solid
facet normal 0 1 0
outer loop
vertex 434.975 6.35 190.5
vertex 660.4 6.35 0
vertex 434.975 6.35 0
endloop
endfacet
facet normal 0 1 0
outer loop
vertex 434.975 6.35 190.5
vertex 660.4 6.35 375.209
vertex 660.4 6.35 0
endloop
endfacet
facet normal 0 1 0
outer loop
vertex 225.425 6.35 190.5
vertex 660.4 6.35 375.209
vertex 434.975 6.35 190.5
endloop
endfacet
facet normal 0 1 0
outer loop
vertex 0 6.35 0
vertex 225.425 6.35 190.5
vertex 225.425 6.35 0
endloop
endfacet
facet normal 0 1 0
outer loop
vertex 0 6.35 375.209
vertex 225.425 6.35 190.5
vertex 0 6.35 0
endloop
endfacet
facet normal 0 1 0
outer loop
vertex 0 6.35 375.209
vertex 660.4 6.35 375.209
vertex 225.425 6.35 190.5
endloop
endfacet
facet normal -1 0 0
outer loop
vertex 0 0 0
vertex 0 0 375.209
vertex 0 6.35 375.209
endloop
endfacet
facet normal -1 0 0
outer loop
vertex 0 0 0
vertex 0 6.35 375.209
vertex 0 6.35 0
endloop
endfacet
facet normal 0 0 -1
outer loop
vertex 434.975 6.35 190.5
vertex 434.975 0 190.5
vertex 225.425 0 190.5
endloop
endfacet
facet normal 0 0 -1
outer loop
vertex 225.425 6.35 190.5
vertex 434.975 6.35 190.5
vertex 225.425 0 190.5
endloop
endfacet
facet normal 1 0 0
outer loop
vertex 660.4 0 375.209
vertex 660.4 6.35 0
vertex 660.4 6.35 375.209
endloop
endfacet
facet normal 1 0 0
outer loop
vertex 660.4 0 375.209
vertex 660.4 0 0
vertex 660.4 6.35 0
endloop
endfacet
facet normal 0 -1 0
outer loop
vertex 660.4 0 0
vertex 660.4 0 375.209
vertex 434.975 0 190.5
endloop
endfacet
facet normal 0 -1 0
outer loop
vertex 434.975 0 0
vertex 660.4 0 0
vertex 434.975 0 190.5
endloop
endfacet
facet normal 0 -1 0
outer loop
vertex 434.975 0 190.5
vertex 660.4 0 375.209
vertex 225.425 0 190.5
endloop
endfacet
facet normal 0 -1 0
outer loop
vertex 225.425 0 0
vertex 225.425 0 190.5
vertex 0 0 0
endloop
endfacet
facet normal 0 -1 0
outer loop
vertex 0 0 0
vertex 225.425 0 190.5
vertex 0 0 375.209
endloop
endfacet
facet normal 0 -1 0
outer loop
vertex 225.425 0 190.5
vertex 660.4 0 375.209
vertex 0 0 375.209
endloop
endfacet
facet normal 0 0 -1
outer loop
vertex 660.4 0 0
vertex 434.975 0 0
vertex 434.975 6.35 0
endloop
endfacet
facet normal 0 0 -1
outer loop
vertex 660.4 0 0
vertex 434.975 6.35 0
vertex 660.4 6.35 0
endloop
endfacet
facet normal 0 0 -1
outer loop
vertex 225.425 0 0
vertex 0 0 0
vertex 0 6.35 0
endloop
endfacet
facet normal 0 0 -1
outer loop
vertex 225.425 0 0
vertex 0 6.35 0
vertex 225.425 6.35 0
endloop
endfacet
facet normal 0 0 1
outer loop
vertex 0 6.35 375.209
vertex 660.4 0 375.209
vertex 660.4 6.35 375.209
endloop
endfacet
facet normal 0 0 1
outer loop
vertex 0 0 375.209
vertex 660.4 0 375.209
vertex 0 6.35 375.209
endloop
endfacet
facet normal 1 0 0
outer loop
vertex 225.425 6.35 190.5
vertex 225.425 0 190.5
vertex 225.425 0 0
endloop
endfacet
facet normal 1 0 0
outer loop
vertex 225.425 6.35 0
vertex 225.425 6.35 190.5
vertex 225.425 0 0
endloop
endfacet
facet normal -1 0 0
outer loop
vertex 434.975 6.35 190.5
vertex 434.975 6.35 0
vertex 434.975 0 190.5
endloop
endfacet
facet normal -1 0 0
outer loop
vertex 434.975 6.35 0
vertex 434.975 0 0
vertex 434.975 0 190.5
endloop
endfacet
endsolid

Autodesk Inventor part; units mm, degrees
ref_plane "YZ Plane" through (0, 0, 0) normal (1, 0, 0) x (0, 1, 0)
ref_plane "XZ Plane" through (0, 0, 0) normal (0, 1, 0) x (-1, 0, 0)
ref_plane "XY Plane" through (0, 0, 0) normal (0, 0, 1) x (1, 0, 0)
sketch "Sketch1" plane through (0, 0, 0) normal (0, 1, 0) x (-1, 0, 0)
  line L0 (0, 0) -> (-660.4, 0)
  line L1 (-660.4, 0) -> (-660.4, 375.2088)
  line L2 (-660.4, 375.2088) -> (0, 375.2088)
  line L3 (0, 375.2088) -> (0, 0)
  dimension "d0" = 660.4
  dimension "d1" = 375.2088
extrude "Extrusion1" add sketch "Sketch1" along normal blind 6.35
sketch "Sketch2" plane through (0, 0, 0) normal (0, -1, 0) x (1, 0, 0)
  line L0 (660.4, 0) -> (0, 0) projected
  line L1 (225.425, 0) -> (434.975, 0)
  line L2 (434.975, 0) -> (434.975, 190.5)
  line L3 (434.975, 190.5) -> (225.425, 190.5)
  line L4 (225.425, 190.5) -> (225.425, 0)
  line L5 (0, 375.2088) -> (0, 0) projected
  line L6 (660.4, 0) -> (660.4, 375.2088) projected
  dimension "d4" = 209.55
  dimension "d5" = 190.5
  dimension "d6" = 225.425
  dimension "d7" = 225.425
extrude "Extrusion2" cut sketch "Sketch2" against normal blind 6.35
properties part number "Electronics Board"
